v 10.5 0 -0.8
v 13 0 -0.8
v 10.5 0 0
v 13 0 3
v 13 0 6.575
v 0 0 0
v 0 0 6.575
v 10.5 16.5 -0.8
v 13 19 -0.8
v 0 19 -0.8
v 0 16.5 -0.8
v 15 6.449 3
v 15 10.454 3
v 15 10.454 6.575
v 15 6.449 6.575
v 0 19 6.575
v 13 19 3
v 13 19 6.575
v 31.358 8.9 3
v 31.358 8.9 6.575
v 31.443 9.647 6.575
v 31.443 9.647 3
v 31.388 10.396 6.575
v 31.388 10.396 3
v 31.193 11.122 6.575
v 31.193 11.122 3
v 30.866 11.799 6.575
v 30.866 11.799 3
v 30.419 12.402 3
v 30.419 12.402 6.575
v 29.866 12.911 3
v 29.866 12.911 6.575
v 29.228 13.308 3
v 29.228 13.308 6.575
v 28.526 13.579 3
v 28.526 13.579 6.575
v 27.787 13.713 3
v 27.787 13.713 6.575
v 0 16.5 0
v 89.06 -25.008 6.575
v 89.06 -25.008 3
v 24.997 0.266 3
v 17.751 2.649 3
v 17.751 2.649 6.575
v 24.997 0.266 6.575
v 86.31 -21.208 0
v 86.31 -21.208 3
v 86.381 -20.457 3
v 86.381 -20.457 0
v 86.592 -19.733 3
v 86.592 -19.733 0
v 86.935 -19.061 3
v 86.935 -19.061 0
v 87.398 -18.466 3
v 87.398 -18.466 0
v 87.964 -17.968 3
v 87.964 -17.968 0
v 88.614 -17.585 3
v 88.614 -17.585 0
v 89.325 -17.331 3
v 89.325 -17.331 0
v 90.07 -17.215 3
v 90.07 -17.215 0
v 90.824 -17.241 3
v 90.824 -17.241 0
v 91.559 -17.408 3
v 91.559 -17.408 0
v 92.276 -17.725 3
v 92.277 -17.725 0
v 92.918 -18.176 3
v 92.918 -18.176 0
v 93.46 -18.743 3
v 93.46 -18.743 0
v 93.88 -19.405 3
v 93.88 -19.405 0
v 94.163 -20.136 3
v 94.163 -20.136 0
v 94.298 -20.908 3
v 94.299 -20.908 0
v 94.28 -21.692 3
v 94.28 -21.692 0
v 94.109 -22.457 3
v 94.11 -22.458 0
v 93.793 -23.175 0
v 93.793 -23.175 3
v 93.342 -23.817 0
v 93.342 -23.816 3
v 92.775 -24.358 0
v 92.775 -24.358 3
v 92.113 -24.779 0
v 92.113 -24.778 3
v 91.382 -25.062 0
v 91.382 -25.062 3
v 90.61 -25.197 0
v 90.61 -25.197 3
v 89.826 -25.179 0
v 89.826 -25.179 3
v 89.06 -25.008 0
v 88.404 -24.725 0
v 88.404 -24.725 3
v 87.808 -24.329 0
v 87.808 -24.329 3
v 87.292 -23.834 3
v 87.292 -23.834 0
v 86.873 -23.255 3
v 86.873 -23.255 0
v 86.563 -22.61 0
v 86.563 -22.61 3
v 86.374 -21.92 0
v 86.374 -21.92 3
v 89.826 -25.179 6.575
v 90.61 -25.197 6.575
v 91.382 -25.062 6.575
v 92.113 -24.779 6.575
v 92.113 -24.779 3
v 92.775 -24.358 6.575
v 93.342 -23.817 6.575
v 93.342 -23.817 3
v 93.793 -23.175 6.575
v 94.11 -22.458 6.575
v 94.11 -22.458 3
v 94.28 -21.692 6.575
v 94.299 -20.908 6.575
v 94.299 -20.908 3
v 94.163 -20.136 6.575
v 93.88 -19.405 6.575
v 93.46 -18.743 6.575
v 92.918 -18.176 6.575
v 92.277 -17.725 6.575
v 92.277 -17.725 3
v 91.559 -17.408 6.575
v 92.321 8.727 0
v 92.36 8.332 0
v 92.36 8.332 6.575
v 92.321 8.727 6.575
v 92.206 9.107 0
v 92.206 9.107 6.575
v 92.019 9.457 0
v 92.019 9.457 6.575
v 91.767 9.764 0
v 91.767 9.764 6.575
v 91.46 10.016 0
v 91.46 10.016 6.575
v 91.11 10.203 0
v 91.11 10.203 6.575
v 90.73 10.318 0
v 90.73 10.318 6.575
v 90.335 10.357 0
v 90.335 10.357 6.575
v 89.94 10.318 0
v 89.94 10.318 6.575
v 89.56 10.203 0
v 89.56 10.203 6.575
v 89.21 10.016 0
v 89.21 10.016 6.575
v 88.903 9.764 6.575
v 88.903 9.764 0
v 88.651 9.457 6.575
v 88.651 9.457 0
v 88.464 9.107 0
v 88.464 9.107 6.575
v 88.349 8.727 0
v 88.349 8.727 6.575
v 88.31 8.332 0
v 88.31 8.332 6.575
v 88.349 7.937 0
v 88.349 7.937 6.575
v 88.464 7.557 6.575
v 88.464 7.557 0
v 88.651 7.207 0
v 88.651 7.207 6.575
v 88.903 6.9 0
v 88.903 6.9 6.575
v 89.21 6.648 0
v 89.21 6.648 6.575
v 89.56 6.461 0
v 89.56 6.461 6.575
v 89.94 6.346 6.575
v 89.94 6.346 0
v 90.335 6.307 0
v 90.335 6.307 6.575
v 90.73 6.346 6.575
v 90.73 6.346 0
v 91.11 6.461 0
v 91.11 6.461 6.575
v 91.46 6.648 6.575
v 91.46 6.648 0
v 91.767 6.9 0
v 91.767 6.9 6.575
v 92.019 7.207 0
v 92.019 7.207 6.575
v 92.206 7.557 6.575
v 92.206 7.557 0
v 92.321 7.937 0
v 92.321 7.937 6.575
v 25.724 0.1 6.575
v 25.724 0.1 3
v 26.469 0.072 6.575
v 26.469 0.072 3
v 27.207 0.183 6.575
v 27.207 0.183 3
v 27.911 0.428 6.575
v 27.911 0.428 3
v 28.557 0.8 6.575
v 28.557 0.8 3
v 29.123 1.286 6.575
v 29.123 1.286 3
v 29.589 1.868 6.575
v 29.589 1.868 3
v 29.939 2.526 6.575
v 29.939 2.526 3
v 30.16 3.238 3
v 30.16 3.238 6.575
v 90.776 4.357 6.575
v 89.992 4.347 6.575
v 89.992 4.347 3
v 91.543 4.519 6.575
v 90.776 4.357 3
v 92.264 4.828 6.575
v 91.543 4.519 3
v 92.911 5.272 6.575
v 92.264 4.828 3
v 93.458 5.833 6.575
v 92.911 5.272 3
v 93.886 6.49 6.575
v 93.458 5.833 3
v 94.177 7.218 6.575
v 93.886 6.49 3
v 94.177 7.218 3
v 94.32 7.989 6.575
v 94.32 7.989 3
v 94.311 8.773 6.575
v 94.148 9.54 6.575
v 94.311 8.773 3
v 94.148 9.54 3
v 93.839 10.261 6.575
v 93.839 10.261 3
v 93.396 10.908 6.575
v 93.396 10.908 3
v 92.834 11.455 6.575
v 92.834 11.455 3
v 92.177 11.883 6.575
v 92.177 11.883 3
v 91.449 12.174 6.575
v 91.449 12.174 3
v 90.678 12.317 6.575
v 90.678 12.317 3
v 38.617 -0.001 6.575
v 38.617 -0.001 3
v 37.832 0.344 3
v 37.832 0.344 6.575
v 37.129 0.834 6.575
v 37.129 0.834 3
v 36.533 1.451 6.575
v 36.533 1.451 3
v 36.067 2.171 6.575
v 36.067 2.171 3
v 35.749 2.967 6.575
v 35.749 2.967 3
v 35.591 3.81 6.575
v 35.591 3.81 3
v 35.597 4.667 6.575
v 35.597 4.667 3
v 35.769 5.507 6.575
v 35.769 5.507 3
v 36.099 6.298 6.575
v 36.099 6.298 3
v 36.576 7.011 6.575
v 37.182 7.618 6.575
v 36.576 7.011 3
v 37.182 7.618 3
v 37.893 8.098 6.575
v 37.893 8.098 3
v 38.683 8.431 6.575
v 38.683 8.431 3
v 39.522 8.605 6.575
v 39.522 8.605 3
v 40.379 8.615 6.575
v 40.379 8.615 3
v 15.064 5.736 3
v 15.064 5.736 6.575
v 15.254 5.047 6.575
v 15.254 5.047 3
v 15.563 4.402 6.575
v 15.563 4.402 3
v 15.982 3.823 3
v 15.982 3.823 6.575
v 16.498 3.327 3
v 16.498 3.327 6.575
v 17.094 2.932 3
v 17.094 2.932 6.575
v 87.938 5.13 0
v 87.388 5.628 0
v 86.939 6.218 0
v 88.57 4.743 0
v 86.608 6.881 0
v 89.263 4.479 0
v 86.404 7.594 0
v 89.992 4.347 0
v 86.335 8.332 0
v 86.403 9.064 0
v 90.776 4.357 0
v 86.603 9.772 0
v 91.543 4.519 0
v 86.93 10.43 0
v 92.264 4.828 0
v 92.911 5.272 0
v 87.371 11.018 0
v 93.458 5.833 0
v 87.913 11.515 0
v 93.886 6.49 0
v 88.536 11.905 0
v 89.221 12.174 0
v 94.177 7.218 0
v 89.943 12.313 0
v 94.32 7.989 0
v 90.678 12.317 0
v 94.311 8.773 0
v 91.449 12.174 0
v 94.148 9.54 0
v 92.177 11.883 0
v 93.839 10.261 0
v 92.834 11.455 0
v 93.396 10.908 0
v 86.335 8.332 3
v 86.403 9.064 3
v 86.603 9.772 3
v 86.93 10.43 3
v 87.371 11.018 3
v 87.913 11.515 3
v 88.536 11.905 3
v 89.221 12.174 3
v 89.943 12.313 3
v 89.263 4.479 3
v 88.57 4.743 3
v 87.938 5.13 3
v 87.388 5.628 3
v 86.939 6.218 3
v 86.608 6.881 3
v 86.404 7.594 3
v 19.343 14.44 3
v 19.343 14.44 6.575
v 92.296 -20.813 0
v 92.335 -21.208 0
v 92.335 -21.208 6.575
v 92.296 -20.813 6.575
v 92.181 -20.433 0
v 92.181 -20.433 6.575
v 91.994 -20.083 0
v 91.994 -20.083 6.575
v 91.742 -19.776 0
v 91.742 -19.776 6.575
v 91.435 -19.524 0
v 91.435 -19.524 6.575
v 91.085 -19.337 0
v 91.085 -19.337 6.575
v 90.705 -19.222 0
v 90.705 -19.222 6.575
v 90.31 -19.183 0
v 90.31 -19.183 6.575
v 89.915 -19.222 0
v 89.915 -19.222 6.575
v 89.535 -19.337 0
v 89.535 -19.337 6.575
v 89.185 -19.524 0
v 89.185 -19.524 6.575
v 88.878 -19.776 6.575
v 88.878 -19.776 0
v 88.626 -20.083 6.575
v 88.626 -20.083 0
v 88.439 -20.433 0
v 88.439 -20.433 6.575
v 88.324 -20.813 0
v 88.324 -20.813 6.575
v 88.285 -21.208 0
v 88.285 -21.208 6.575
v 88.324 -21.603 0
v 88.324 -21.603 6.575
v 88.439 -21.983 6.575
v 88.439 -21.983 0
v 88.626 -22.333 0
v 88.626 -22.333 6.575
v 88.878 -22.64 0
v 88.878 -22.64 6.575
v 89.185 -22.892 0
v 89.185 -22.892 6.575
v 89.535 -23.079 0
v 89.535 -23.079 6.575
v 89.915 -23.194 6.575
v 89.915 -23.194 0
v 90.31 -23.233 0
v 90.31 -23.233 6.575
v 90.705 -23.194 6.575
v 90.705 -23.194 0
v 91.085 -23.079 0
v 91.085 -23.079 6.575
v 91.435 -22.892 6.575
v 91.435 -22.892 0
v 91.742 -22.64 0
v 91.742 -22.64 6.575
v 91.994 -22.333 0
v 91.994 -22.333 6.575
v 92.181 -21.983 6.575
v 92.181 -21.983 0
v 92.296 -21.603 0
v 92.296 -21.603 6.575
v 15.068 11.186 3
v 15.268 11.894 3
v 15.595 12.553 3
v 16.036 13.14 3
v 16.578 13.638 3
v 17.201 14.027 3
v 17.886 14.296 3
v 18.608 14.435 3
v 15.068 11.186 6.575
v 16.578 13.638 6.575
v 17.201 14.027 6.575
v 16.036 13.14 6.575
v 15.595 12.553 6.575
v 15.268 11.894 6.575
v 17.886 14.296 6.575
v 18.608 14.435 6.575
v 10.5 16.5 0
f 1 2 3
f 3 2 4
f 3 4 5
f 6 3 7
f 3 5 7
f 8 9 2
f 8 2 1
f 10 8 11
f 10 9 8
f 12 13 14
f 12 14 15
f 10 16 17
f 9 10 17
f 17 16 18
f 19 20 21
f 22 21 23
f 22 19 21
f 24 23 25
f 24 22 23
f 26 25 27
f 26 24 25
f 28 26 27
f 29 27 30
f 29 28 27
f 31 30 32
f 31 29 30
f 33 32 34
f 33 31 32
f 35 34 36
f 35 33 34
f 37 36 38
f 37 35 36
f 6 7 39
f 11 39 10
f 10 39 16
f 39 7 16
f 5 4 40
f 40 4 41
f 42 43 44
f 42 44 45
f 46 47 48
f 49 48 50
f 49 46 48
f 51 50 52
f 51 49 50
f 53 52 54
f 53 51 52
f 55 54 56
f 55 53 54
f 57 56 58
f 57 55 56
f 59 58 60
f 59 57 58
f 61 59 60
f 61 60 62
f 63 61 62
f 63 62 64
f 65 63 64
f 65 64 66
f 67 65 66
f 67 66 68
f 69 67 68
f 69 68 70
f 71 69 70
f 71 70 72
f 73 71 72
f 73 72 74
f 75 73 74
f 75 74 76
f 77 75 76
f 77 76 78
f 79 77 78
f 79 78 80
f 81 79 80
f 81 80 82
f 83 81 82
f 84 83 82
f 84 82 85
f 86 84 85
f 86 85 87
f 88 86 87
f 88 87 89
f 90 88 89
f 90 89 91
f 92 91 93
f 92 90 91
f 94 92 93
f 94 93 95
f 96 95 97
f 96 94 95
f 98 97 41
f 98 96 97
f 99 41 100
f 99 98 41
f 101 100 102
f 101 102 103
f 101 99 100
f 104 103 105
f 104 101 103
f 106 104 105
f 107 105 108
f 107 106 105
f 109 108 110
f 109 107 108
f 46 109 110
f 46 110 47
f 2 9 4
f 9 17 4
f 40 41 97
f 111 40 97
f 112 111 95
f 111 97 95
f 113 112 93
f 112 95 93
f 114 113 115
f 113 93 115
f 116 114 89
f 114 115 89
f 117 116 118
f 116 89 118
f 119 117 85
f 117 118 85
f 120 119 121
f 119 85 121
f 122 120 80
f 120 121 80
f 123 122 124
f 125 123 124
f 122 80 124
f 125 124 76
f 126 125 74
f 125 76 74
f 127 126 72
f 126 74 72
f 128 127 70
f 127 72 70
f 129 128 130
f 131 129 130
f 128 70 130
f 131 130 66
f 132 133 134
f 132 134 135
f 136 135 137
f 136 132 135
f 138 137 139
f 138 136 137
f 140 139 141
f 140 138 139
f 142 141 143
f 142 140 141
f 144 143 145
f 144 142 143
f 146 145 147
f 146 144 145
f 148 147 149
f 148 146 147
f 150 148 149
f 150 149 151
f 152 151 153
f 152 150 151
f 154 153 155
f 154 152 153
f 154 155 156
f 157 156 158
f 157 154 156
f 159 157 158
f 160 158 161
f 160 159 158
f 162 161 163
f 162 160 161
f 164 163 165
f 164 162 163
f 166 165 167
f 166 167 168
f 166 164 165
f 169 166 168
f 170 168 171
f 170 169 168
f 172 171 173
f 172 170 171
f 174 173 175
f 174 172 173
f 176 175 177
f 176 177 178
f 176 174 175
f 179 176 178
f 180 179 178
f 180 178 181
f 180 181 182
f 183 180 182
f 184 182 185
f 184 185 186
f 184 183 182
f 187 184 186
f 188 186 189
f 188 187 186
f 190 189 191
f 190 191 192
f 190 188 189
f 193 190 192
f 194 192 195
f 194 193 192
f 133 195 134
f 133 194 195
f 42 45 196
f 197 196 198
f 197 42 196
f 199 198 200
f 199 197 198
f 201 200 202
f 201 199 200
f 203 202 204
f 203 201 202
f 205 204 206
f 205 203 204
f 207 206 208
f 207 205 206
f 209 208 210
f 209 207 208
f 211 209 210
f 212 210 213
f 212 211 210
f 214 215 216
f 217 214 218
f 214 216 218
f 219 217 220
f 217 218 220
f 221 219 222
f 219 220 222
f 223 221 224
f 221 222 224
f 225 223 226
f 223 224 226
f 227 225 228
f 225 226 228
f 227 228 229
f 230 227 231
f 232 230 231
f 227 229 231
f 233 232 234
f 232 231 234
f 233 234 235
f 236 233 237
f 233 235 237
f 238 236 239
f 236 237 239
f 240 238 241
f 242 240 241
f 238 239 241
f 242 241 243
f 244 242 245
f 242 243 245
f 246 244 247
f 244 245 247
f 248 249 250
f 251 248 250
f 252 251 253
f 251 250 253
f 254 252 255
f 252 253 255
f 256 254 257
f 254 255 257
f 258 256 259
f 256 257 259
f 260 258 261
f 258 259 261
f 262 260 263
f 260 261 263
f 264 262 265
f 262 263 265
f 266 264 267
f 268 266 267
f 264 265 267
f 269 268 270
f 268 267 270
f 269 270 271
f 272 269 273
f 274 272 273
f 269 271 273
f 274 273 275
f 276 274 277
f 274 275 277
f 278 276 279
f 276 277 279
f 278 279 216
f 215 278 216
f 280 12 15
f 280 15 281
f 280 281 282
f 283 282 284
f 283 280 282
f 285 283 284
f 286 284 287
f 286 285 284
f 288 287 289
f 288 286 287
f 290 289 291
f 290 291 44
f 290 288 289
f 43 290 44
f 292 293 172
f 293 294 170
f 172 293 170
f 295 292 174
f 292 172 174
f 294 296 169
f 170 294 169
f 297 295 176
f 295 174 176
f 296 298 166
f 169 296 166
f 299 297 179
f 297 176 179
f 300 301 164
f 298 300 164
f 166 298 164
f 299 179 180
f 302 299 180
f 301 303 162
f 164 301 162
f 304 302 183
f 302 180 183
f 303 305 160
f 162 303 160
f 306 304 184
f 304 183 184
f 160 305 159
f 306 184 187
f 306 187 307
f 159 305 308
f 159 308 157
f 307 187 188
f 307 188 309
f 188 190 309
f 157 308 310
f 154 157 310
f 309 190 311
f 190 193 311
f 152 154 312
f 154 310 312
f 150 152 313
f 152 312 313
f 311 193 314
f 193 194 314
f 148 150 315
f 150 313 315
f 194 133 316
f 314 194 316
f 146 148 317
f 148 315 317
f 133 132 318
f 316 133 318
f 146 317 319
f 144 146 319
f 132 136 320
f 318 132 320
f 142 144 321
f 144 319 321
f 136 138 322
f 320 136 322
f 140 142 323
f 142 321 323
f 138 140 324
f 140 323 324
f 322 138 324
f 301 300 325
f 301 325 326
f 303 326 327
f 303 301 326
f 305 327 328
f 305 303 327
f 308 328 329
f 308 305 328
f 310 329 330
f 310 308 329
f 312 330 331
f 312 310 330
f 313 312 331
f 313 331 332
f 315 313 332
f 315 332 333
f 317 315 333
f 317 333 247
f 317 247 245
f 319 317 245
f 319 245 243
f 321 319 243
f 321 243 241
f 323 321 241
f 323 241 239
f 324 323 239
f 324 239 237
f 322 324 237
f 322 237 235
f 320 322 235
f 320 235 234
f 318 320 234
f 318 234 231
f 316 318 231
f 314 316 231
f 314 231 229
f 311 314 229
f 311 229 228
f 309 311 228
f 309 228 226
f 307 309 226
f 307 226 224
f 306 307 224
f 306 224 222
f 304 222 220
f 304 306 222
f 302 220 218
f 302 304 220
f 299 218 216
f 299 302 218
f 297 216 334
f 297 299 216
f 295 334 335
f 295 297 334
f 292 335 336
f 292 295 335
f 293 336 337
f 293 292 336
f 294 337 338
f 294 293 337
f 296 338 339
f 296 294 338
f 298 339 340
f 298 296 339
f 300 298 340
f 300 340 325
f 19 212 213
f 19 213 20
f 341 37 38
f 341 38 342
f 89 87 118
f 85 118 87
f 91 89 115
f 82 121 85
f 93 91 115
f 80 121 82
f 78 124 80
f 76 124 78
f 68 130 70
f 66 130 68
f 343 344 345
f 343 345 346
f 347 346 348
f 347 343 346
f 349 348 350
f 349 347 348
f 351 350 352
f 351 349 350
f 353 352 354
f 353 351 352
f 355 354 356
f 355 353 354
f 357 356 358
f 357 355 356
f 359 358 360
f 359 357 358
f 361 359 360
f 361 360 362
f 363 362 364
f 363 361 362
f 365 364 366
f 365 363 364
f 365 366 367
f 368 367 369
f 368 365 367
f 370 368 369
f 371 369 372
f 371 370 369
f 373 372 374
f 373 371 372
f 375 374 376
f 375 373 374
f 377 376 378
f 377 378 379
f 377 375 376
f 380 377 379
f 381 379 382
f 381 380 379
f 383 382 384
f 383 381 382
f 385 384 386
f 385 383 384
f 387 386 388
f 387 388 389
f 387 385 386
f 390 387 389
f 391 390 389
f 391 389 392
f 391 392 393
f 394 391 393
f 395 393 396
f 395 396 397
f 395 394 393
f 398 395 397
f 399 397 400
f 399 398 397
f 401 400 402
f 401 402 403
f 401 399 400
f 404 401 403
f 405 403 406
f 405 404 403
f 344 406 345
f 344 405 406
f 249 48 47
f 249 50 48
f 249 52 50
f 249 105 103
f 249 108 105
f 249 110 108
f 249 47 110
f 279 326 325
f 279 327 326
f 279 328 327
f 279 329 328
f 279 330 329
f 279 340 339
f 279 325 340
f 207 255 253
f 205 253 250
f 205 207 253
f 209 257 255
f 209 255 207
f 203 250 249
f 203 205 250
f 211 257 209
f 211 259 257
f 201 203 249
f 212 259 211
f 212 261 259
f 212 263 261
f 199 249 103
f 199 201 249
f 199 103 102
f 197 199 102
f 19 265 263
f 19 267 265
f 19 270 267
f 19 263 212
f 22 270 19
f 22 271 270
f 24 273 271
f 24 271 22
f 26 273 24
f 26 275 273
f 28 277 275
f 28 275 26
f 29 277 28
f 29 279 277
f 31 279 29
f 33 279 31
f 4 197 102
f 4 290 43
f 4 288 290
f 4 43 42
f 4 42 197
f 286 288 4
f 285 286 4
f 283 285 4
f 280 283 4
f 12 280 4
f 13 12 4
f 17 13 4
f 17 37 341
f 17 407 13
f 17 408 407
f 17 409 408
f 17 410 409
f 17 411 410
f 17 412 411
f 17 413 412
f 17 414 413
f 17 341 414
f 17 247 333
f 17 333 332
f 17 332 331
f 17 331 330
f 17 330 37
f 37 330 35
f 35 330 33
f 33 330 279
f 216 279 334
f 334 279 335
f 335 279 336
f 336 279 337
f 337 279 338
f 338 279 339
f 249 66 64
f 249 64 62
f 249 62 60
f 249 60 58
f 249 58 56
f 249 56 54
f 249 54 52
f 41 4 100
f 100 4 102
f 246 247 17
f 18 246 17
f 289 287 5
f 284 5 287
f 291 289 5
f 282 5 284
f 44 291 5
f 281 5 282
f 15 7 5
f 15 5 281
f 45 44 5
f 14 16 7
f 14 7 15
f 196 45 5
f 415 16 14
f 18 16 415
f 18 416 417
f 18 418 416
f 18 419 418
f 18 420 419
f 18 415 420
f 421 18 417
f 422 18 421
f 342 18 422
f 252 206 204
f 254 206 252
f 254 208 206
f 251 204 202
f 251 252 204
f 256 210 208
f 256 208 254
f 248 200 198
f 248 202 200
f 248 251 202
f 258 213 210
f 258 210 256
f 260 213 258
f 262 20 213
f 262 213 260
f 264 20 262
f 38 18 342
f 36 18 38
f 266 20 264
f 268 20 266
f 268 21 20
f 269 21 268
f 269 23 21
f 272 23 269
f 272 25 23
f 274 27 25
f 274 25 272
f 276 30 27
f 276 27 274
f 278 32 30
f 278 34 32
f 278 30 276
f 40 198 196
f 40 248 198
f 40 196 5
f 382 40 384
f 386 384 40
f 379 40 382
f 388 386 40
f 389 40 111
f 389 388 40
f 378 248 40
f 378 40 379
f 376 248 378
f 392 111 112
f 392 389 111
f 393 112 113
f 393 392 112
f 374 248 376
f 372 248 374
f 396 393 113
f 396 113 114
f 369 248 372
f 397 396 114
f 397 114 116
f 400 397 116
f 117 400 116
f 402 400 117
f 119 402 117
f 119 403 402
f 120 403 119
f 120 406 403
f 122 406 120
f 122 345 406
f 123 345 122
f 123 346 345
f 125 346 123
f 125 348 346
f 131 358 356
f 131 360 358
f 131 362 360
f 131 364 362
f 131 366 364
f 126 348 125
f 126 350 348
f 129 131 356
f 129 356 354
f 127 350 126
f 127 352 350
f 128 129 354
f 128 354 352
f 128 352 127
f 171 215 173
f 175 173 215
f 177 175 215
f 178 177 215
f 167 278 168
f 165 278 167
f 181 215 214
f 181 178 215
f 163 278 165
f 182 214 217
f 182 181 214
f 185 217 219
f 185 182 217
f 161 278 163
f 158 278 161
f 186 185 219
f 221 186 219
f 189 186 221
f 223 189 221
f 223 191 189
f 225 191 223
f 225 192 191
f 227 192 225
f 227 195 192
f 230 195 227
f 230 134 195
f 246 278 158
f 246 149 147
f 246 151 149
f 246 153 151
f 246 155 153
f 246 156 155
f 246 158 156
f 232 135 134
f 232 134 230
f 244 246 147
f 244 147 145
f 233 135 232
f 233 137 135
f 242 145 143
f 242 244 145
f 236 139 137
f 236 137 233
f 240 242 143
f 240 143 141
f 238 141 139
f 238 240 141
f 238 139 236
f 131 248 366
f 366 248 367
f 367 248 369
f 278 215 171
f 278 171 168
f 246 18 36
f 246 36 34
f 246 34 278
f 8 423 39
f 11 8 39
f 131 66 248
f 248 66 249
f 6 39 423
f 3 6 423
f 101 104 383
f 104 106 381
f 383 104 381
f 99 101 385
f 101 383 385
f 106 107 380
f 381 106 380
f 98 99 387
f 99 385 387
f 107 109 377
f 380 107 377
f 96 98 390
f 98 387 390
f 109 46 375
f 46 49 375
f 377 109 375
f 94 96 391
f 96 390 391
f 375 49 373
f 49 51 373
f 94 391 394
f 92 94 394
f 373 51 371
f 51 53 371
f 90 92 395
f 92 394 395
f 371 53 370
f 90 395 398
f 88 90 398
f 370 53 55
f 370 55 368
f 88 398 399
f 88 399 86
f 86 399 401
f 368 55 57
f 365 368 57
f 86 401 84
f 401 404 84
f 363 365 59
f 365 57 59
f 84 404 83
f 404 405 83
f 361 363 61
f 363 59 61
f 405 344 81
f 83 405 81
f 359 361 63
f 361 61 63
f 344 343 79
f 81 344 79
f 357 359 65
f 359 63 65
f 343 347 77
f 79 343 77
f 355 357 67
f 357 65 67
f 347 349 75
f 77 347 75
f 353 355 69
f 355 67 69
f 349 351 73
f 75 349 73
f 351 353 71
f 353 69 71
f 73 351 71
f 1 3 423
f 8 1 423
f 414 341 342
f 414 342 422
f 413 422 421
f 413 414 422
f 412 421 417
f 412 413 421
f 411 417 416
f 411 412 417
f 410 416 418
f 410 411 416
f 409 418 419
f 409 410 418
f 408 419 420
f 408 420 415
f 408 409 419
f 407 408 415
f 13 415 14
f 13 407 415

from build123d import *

# Parameters (mm, degrees)
SKETCH2_R           = 2.025
BOSS_EXTRUDE1_DEPTH = 6.575
SKETCH3_W           = 85
SKETCH3_H           = 45
SKETCH3_R           = 4
CUT_EXTRUDE1_DEPTH  = 3
BOSS_EXTRUDE2_DEPTH = 0.8


with BuildPart() as part:
    # Sketch2 → Boss-Extrude1 (new body)
    with BuildSketch(Plane.XY):
        with BuildLine():
            Line((0, 19), (0, 0))
            Line((0, 0), (13, 0))
            Line((13, 0), (89.060496565, -25.00806589))
            ThreePointArc((89.060496565, -25.00806589), (94.109744025, -22.45755612), (91.559234256, -17.40830866))
            Line((91.559234256, -17.40830866), (38.617230635, -0.001413167))
            ThreePointArc((38.617230635, -0.001413167), (35.662685114, 5.091263251), (40.379460771, 8.614999867))
            Line((40.379460771, 8.614999867), (89.992289035, 4.346816993))
            ThreePointArc((89.992289035, 4.346816993), (94.32042132, 7.989243509), (90.677994805, 12.317375794))
            Line((90.677994805, 12.317375794), (13, 19))
            Line((13, 19), (0, 19))
        make_face()
        with Locations((90.33514192, 8.332096393)):
            Circle(SKETCH2_R, mode=Mode.SUBTRACT)
        with Locations((90.30986541, -21.208187275)):
            Circle(SKETCH2_R, mode=Mode.SUBTRACT)
        with BuildLine():
            Line((15, 10.45427111), (15, 6.44857097))
            ThreePointArc((15, 6.44857097), (15.759824435, 4.103093981), (17.750631155, 2.648692356))
            Line((17.750631155, 2.648692356), (24.997412202, 0.266010331))
            ThreePointArc((24.997412202, 0.266010331), (28.242503446, 0.599321176), (30.16022559, 3.238270793))
            Line((30.16022559, 3.238270793), (31.357615095, 8.900202452))
            ThreePointArc((31.357615095, 8.900202452), (30.656648203, 12.111093006), (27.787023436, 13.713100006))
            Line((27.787023436, 13.713100006), (19.342852885, 14.43955051))
            ThreePointArc((19.342852885, 14.43955051), (16.29550481, 13.401423255), (15, 10.45427111))
        make_face(mode=Mode.SUBTRACT)
    extrude(amount=BOSS_EXTRUDE1_DEPTH)

    # Sketch3 → Cut-Extrude1 (cut)
    with BuildSketch(Plane(origin=(0, 0, 0), x_dir=(-1, 0, 0), z_dir=(0, 0, -1))):
        with Locations((-55.5, -3.5)):
            Rectangle(SKETCH3_W, SKETCH3_H)
        with Locations((-90.3351, 8.3321)):
            Circle(SKETCH3_R, mode=Mode.SUBTRACT)
        with Locations((-90.3096, -21.2081)):
            Circle(SKETCH3_R, mode=Mode.SUBTRACT)
    extrude(amount=-CUT_EXTRUDE1_DEPTH, mode=Mode.SUBTRACT)

    # Sketch4 → Boss-Extrude2 (add)
    with BuildSketch(Plane(origin=(0, 0, 0), x_dir=(-1, 0, 0), z_dir=(0, 0, -1))):
        Polygon((0, 19), (-13, 19), (-13, 0), (-10.5, 0), (-10.5, 16.5), (0, 16.5), align=None)
    extrude(amount=BOSS_EXTRUDE2_DEPTH)


solid = part.part
